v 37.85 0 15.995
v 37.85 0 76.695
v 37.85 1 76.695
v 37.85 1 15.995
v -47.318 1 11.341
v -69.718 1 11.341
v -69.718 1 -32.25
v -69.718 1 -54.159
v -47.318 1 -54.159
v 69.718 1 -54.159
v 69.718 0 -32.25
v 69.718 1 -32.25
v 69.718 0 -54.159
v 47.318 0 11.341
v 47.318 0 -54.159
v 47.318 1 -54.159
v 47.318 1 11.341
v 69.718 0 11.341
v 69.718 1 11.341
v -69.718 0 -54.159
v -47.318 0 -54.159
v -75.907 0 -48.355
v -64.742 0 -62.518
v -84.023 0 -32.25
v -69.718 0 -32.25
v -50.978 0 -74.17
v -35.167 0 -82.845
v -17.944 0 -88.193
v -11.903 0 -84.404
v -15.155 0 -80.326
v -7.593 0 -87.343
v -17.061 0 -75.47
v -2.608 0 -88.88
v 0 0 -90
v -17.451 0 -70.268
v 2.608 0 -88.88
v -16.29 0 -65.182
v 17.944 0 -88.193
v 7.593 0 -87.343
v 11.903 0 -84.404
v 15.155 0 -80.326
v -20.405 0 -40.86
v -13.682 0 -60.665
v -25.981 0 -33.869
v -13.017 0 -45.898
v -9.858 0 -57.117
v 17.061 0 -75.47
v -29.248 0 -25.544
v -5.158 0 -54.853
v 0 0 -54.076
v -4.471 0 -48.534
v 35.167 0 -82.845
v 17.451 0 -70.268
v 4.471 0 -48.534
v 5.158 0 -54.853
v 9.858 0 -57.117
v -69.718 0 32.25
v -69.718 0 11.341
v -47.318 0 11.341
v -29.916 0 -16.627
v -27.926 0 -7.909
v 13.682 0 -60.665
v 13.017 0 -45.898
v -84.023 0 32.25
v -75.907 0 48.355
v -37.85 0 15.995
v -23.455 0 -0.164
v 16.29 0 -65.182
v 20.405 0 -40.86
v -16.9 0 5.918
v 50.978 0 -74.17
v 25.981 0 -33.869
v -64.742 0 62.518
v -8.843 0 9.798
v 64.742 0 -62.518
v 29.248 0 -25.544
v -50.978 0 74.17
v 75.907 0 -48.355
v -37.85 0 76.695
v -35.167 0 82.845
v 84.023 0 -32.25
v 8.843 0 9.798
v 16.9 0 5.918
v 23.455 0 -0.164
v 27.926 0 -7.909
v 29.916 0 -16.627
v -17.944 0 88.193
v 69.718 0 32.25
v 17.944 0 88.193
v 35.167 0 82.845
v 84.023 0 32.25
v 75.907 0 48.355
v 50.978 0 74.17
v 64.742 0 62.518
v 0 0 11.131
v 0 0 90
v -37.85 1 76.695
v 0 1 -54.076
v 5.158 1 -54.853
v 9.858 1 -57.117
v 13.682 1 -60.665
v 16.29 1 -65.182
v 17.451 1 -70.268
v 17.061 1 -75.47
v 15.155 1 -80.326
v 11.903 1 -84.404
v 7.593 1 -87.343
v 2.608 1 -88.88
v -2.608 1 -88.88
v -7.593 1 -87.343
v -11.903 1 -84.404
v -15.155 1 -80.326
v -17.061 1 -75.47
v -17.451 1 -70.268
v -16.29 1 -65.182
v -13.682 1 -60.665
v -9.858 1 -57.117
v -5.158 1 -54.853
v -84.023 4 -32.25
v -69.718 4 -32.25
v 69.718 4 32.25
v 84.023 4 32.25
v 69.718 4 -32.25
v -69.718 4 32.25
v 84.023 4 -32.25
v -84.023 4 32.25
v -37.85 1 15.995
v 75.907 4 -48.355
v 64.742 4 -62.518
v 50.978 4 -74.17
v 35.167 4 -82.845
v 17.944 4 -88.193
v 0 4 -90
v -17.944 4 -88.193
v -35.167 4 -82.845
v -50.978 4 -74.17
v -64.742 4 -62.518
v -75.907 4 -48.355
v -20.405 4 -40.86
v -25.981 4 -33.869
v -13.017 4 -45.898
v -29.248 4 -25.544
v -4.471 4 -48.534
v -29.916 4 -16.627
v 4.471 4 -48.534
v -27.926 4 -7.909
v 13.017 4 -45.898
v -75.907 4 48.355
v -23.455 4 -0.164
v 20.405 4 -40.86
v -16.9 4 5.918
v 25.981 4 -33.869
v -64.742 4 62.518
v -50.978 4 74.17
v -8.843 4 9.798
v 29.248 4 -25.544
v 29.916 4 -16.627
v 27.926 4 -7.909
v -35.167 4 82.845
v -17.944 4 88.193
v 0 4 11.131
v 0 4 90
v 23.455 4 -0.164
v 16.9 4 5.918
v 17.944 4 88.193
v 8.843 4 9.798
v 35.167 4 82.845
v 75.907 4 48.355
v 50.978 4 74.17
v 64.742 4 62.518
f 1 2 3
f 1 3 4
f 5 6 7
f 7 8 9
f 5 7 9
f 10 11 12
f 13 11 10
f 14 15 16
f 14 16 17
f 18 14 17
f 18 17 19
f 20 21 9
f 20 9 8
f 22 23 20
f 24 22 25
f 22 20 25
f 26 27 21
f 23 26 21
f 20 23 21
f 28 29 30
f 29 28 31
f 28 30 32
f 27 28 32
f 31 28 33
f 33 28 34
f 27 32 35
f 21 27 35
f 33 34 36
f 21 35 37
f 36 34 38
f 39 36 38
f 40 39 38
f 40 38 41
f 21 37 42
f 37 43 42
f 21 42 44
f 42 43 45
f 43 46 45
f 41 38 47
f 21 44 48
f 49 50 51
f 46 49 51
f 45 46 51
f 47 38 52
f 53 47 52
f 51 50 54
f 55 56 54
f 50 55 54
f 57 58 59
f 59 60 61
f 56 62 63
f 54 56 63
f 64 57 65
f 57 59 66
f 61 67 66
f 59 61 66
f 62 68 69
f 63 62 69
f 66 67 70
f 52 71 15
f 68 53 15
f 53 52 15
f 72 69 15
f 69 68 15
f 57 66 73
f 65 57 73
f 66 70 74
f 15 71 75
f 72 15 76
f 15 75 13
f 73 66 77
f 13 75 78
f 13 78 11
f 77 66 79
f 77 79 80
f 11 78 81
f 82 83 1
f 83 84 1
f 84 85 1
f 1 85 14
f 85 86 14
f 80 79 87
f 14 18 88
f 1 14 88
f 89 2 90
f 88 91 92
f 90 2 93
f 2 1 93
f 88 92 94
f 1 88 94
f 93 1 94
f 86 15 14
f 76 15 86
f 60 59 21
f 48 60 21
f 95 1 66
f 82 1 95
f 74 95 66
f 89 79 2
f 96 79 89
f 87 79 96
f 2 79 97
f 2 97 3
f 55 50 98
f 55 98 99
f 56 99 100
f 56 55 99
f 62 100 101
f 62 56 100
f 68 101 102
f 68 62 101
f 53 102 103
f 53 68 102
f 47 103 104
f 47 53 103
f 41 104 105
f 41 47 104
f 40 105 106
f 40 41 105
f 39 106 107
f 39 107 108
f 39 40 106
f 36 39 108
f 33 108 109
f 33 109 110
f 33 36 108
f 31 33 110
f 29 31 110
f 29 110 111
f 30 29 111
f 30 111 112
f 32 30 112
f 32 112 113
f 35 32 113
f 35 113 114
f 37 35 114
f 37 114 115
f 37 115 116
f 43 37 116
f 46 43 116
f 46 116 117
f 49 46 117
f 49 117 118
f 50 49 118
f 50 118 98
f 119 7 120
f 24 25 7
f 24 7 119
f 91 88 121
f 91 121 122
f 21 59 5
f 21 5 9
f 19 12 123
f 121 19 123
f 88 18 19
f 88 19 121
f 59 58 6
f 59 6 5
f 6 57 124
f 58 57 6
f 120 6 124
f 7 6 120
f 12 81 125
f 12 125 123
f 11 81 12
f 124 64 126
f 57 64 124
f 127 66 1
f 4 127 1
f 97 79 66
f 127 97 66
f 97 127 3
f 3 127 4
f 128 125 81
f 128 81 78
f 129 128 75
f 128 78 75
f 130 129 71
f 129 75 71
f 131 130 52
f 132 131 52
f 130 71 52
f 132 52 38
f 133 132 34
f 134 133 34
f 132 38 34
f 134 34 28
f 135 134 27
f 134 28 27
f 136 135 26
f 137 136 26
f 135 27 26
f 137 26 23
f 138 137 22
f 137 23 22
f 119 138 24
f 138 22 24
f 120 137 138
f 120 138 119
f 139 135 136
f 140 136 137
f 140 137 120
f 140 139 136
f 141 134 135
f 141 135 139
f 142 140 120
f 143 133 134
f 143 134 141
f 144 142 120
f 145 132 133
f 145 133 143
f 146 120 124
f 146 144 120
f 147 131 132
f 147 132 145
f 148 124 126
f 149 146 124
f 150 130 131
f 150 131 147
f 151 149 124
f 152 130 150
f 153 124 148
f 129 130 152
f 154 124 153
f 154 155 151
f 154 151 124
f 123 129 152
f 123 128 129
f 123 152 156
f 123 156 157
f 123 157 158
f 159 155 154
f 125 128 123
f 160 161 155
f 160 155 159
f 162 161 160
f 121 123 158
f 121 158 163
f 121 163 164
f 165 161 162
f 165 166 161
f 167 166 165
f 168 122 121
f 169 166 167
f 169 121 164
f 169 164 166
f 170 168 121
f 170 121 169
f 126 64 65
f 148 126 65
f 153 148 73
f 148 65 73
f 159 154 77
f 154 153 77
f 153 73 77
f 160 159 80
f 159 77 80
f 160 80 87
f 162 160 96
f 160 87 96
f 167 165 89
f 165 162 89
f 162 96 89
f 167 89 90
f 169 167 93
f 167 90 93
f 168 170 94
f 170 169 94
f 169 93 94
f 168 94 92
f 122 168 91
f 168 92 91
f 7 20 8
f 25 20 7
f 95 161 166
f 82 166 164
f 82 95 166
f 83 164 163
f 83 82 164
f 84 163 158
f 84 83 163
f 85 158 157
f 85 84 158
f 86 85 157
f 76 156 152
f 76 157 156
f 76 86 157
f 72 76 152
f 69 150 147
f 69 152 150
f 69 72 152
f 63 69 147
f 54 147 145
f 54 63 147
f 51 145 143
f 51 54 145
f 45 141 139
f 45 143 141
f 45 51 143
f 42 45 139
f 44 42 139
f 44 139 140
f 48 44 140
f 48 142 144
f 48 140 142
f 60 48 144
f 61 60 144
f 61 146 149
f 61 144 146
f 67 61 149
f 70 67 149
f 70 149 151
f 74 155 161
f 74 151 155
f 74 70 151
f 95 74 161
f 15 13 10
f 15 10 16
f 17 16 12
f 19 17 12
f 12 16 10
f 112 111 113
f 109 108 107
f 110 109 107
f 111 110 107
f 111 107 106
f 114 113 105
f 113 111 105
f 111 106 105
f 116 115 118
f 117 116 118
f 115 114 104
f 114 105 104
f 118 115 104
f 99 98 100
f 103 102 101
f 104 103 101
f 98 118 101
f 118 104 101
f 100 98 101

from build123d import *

# Parameters (mm, degrees)
SKETCH_2_R               = 90
EXTRUDE_1_DEPTH          = 4
CUT_EXTRUDE_1_DEPTH      = 128.342059038
CUT_EXTRUDE_1_DEPTH_BACK = 10
CUT_EXTRUDE_2_DEPTH      = 1
CUT_EXTRUDE_2_DEPTH_BACK = 1
SKETCH_2_7_W             = 22.4
SKETCH_2_7_H             = 65.5
SKETCH_2_8_R             = 30
CUT_EXTRUDE_4_DEPTH      = 124.190655084
CUT_EXTRUDE_5_DEPTH      = 1
CUT_EXTRUDE_5_DEPTH_BACK = 1
SKETCH_2_9_W             = 75.7
SKETCH_2_9_H             = 60.7
CUT_EXTRUDE_6_DEPTH      = 1
CUT_EXTRUDE_6_DEPTH_BACK = 1
SKETCH_2_10_R            = 17.5


with BuildPart() as part:
    # 草圖2 → 填料-伸長1 (new body)
    with BuildSketch(Plane(origin=(0, 0, 0), x_dir=(1, 0, 0), z_dir=(0, 1, 0))):
        Circle(SKETCH_2_R)
    extrude(amount=EXTRUDE_1_DEPTH)

    # 草圖2<5> → 除料-伸長1 (cut, two sides: drawn at the far end of the back side and taken through both)
    with BuildSketch(Plane(origin=(0, 0, 0), x_dir=(1, 0, 0), z_dir=(0, 1, 0)).offset(-CUT_EXTRUDE_1_DEPTH_BACK)):
        with BuildLine():
            Line((84.023434231, 32.25), (69.717716958, 32.25))
            Line((69.717716958, 32.25), (69.717716958, -32.25))
            Line((69.717716958, -32.25), (84.023434231, -32.25))
            ThreePointArc((84.023434231, -32.25), (90, 0), (84.023434231, 32.25))
        make_face()
        with BuildLine():
            Line((-69.717716958, 32.25), (-84.023434231, 32.25))
            ThreePointArc((-84.023434231, 32.25), (-90, 0), (-84.023434231, -32.25))
            Line((-84.023434231, -32.25), (-69.717716958, -32.25))
            Line((-69.717716958, -32.25), (-69.717716958, 32.25))
        make_face()
    extrude(amount=CUT_EXTRUDE_1_DEPTH + CUT_EXTRUDE_1_DEPTH_BACK, mode=Mode.SUBTRACT)

    # 草圖2<7> → 除料-伸長2 (cut, two sides: drawn at the far end of the back side and taken through both)
    with BuildSketch(Plane(origin=(0, 0, 0), x_dir=(1, 0, 0), z_dir=(0, 1, 0)).offset(-CUT_EXTRUDE_2_DEPTH_BACK)):
        with Locations((58.517716958, 21.408982887)):
            Rectangle(SKETCH_2_7_W, SKETCH_2_7_H)
        with Locations((-58.517716958, 21.408982887)):
            Rectangle(SKETCH_2_7_W, SKETCH_2_7_H)
    extrude(amount=CUT_EXTRUDE_2_DEPTH + CUT_EXTRUDE_2_DEPTH_BACK, mode=Mode.SUBTRACT)

    # 草圖2<8> → 除料-伸長4 (cut, through all)
    with BuildSketch(Plane(origin=(0, 0, 0), x_dir=(1, 0, 0), z_dir=(0, 1, 0))):
        with Locations((0, 18.868843399)):
            Circle(SKETCH_2_8_R)
    extrude(amount=CUT_EXTRUDE_4_DEPTH, mode=Mode.SUBTRACT)

    # 草圖2<9> → 除料-伸長5 (cut, two sides: drawn at the far end of the back side and taken through both)
    with BuildSketch(Plane(origin=(0, 0, 0), x_dir=(1, 0, 0), z_dir=(0, 1, 0)).offset(-CUT_EXTRUDE_5_DEPTH_BACK)):
        with Locations((0, -46.344841494)):
            Rectangle(SKETCH_2_9_W, SKETCH_2_9_H)
    extrude(amount=CUT_EXTRUDE_5_DEPTH + CUT_EXTRUDE_5_DEPTH_BACK, mode=Mode.SUBTRACT)

    # 草圖2<10> → 除料-伸長6 (cut, two sides: drawn at the far end of the back side and taken through both)
    with BuildSketch(Plane(origin=(0, 0, 0), x_dir=(1, 0, 0), z_dir=(0, 1, 0)).offset(-CUT_EXTRUDE_6_DEPTH_BACK)):
        with Locations((0, 71.575794202)):
            Circle(SKETCH_2_10_R)
    extrude(amount=CUT_EXTRUDE_6_DEPTH + CUT_EXTRUDE_6_DEPTH_BACK, mode=Mode.SUBTRACT)


solid = part.part
